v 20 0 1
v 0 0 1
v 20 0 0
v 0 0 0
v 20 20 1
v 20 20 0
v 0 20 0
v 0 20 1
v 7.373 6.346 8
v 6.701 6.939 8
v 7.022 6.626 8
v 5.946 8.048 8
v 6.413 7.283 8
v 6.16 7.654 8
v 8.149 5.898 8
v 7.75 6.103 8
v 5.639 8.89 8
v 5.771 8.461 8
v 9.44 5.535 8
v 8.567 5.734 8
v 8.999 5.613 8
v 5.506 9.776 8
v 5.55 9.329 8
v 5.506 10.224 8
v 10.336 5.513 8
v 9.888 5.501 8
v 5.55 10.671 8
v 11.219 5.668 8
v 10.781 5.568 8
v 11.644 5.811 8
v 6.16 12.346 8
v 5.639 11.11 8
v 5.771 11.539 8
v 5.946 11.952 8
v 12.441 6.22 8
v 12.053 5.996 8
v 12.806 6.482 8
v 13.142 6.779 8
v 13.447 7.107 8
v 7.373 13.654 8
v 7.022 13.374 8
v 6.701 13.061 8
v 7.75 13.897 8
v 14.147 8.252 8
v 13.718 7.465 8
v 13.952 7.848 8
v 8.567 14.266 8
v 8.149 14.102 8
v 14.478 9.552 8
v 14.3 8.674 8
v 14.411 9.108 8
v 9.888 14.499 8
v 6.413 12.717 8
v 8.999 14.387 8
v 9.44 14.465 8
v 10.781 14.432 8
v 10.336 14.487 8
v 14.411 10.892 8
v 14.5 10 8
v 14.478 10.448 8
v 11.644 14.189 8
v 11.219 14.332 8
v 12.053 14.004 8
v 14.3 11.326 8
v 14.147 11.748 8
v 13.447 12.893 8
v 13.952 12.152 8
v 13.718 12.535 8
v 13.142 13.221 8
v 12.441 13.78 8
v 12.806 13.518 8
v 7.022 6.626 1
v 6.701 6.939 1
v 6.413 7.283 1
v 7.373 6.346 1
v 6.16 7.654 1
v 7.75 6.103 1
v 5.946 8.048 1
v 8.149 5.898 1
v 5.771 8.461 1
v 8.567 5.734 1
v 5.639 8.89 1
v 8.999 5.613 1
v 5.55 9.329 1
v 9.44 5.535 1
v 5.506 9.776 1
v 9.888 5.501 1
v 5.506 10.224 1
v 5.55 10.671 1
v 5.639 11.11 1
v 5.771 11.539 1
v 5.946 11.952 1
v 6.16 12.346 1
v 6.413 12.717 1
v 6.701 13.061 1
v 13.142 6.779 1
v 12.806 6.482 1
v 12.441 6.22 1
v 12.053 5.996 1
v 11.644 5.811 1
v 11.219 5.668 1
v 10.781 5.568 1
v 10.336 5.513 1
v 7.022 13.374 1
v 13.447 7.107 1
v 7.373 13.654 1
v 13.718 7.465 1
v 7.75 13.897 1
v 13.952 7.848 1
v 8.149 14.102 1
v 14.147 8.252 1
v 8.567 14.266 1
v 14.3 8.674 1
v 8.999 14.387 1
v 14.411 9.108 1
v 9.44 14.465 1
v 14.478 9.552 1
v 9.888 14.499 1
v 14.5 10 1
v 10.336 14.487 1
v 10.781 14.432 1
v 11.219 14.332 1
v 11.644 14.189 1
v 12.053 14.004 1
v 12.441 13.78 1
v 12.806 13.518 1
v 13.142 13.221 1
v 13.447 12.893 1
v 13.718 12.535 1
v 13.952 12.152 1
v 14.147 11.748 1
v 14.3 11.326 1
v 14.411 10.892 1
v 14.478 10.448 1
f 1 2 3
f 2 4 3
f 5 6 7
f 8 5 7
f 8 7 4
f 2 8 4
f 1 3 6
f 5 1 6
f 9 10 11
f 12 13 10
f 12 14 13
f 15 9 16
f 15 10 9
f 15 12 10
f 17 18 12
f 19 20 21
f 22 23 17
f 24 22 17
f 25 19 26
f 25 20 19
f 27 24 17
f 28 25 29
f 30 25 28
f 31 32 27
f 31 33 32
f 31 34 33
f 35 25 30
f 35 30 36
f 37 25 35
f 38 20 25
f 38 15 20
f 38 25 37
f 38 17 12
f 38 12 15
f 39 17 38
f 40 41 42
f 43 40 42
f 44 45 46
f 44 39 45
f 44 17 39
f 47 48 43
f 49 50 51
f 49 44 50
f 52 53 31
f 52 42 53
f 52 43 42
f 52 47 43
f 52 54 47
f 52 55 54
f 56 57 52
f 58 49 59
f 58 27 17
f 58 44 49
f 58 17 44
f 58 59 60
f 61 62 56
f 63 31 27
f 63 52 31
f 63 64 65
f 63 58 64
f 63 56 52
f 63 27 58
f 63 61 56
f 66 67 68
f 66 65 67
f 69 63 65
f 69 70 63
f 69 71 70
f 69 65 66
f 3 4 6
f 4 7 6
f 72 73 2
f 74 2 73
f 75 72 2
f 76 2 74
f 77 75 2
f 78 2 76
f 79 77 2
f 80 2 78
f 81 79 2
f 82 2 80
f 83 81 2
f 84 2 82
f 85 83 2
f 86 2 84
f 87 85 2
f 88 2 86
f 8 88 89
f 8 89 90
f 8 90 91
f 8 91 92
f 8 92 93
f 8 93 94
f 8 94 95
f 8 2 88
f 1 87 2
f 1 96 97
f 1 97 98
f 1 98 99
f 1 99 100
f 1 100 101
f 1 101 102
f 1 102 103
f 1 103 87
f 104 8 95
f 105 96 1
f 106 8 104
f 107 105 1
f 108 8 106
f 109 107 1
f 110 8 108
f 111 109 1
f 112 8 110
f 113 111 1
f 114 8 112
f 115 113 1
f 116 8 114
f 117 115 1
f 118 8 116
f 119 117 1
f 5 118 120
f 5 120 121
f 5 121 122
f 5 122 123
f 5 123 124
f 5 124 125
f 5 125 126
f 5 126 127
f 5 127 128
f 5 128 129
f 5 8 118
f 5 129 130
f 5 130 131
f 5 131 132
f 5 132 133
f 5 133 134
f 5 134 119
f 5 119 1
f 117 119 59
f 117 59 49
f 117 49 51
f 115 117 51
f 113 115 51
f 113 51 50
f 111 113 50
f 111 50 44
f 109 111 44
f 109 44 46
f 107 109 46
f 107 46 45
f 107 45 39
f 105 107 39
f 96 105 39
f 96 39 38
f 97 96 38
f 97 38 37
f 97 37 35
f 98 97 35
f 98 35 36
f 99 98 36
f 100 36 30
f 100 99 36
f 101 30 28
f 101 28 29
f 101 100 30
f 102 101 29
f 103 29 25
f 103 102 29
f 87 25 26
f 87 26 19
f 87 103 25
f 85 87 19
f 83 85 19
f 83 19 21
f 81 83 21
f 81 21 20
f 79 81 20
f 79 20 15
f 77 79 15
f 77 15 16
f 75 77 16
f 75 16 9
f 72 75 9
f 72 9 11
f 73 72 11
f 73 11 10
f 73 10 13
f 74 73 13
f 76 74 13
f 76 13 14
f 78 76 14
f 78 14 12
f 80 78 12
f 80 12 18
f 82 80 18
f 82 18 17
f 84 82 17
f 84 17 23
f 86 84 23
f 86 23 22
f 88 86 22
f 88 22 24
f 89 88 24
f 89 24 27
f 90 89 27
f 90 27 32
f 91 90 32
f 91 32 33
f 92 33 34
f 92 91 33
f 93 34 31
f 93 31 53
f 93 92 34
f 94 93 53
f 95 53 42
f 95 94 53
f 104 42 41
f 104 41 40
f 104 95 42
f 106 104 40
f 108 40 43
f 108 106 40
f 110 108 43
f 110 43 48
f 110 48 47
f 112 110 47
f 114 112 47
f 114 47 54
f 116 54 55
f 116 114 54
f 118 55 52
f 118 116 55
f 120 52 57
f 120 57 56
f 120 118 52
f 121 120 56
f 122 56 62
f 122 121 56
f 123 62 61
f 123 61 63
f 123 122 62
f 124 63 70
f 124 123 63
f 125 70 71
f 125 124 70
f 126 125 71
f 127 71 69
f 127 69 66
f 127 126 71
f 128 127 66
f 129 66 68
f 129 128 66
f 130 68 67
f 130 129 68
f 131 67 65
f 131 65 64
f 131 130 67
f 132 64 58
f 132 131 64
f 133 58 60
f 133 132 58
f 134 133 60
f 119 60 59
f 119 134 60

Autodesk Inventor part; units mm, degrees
ref_plane "YZ Plane" through (0, 0, 0) normal (1, 0, 0) x (0, 1, 0)
ref_plane "XZ Plane" through (0, 0, 0) normal (0, 1, 0) x (-1, 0, 0)
ref_plane "XY Plane" through (0, 0, 0) normal (0, 0, 1) x (1, 0, 0)
sketch "Sketch1" plane through (0, 0, 0) normal (0, 0, 1) x (1, 0, 0)
  line L0 (0, 0) -> (20, 0)
  line L1 (20, 0) -> (20, 20)
  line L2 (20, 20) -> (0, 20)
  line L3 (0, 20) -> (0, 0)
  dimension "d0" = 20
  dimension "d1" = 20
extrude "Extrusion1" add sketch "Sketch1" along normal blind 1
sketch "Sketch2" plane through (0, 0, 1) normal (0, 0, 1) x (1, 0, 0)
  line L0 (0, 20) -> (10, 20)
  line L1 (20, 20) -> (0, 20) projected
  line L2 (10, 20) -> (10, 10)
  circle A0 centre (10, 10) radius 4.5
  point P0 (0, 0)
  dimension "d4" = 10
  dimension "d5" = 10
  dimension "d6" = 9
extrude "Extrusion2" add sketch "Sketch2" along normal blind 7
thread "Thread1" size "M9x1.25" class "6g" standard "ANSI Metric M Profile" full length
properties part number "crank shaft nut"
